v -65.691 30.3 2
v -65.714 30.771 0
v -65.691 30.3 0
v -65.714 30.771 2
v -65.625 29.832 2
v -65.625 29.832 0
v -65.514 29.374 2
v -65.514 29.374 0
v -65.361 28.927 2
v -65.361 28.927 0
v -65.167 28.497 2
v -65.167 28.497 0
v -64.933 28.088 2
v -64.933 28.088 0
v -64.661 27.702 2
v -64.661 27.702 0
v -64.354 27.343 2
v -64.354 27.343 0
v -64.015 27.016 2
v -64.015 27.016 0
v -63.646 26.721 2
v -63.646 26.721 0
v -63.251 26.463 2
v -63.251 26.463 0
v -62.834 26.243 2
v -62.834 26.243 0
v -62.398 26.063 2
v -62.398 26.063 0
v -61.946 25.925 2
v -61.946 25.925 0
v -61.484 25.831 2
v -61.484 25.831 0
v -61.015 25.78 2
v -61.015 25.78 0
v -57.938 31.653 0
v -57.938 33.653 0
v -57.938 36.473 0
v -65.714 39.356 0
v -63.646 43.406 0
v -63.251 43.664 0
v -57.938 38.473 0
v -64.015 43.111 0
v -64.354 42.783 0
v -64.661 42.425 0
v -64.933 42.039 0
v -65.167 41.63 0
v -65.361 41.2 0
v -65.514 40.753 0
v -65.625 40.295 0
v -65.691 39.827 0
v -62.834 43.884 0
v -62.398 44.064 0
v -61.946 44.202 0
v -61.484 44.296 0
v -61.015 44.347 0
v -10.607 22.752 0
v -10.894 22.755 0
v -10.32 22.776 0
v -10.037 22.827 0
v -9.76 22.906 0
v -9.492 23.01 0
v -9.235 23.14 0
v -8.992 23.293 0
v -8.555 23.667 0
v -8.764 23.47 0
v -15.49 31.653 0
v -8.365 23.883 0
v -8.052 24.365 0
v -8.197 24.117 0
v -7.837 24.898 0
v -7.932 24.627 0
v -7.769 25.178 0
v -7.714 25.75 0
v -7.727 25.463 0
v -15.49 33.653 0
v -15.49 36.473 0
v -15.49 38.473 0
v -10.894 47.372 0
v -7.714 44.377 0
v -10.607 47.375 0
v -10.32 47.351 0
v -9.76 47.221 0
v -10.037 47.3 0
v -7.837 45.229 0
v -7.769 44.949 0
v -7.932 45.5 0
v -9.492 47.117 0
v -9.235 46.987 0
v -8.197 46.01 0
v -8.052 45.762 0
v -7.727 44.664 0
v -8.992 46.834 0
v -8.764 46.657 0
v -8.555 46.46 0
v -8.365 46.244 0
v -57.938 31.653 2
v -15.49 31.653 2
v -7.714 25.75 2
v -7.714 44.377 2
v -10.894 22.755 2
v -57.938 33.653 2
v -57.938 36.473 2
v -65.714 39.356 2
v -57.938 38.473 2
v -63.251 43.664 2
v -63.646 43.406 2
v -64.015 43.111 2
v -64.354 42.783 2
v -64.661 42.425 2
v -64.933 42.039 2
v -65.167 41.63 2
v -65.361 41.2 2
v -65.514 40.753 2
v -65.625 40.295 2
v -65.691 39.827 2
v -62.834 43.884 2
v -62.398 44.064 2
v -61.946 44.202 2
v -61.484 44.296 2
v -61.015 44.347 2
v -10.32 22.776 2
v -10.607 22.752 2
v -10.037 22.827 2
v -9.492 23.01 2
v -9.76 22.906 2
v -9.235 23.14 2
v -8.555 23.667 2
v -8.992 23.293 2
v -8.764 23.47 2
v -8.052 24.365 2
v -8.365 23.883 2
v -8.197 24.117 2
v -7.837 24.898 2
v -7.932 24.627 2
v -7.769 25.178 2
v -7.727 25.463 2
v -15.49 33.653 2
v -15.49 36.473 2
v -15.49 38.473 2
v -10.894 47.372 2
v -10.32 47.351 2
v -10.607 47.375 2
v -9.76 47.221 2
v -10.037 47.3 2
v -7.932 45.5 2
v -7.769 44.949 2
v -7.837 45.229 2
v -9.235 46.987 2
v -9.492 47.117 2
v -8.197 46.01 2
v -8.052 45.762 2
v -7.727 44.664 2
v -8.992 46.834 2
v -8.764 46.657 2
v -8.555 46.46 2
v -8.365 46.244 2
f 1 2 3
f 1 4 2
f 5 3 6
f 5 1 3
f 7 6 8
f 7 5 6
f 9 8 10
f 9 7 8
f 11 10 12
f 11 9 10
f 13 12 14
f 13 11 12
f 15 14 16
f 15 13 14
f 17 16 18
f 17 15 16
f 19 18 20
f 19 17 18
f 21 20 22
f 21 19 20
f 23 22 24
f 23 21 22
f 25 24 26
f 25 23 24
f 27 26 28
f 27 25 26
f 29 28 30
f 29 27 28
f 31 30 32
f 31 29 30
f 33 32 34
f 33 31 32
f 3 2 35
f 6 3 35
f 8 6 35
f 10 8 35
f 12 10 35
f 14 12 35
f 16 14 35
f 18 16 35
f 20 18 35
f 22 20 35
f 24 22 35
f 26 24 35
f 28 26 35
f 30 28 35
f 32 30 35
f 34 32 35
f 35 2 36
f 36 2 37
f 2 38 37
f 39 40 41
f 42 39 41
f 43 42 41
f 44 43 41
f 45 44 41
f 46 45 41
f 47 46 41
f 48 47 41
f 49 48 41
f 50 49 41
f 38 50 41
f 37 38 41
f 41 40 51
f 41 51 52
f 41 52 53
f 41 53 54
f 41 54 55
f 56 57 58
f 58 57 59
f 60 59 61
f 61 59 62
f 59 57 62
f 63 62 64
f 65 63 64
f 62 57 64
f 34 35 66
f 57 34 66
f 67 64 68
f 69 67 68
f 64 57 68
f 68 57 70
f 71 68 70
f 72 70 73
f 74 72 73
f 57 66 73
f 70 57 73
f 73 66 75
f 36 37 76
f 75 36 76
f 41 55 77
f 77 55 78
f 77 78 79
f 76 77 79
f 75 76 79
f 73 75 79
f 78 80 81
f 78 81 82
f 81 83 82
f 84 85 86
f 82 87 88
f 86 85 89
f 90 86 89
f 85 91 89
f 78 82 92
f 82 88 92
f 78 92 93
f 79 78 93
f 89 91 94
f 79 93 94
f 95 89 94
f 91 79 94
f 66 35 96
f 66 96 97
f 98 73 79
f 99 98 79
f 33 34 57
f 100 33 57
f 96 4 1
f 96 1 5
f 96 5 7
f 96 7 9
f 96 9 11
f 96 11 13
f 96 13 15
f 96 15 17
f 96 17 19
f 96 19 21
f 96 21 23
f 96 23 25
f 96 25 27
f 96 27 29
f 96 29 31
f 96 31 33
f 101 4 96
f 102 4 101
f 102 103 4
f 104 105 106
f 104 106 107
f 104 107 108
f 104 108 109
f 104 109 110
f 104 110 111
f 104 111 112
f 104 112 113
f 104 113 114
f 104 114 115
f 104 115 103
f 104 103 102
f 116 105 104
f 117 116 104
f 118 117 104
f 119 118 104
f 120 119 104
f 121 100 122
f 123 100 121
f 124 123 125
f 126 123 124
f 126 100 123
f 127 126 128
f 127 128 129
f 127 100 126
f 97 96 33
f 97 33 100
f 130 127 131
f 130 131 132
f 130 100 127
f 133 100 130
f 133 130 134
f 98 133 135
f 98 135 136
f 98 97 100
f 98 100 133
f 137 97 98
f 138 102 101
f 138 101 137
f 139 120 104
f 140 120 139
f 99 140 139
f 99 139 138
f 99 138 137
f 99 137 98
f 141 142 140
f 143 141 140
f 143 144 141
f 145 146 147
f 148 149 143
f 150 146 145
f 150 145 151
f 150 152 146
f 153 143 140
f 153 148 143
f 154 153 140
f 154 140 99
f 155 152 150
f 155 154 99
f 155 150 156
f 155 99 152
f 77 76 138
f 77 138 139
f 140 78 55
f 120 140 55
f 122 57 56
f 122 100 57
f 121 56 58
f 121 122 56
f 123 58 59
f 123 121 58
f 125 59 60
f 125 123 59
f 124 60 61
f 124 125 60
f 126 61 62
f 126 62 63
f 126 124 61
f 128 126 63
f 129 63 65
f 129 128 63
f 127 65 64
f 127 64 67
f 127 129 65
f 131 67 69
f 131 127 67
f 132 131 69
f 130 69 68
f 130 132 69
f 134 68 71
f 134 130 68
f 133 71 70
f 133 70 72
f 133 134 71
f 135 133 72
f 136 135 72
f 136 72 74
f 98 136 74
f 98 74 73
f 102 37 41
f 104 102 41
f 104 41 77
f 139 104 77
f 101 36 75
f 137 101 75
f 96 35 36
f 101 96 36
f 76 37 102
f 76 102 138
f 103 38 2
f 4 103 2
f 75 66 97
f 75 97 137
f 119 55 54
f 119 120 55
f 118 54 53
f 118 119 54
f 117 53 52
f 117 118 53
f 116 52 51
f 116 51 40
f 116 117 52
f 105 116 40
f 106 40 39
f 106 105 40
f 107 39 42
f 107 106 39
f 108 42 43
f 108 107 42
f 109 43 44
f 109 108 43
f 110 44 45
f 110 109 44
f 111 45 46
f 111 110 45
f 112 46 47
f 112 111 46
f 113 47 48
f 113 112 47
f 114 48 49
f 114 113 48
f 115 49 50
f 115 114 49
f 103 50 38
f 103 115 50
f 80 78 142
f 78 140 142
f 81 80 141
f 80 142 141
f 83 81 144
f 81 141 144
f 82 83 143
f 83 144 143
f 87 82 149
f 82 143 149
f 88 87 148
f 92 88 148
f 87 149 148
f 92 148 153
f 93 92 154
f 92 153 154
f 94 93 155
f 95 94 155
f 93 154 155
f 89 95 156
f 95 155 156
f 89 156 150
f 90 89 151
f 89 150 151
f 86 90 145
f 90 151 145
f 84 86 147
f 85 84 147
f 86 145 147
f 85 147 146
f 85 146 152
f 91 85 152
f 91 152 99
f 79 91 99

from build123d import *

# Parameters (mm, degrees)
F0_W     = 42.4481438452
F0_H     = 2
F1_DEPTH = 2
F2_R     = 3
F3_R     = 5


with BuildPart() as f1:
    # F0 (on Top) → F1 (new body)
    with BuildSketch(Plane.XY):
        Polygon((-65.7136544558, 44.0634722376), (-65.7136544558, 36.4734722376), (-65.7136544558, 35.0634722376), (-65.7136544558, 33.6534722376), (-65.7136544558, 26.0634722376), (-7.7136544558, 22.5634722376), (-7.7136544558, 47.5634722376), align=None)
        with Locations((-36.7136544558, 32.6534722376)):
            Rectangle(F0_W, F0_H, mode=Mode.SUBTRACT)
        with Locations((-36.7136544558, 37.4734722376)):
            Rectangle(F0_W, F0_H, mode=Mode.SUBTRACT)
    extrude(amount=F1_DEPTH)

    # F2
    f2_edges = [f1.edges().sort_by_distance(p)[0] for p in [
        (-7.713654, 47.563472, 1),
        (-7.713654, 22.563472, 1),
    ]]
    fillet(f2_edges, radius=F2_R)

    # F3
    f3_edges = [f1.edges().sort_by_distance(p)[0] for p in [
        (-65.713654, 26.063472, 1),
        (-65.713654, 44.063472, 1),
    ]]
    fillet(f3_edges, radius=F3_R)


solid = f1.part
